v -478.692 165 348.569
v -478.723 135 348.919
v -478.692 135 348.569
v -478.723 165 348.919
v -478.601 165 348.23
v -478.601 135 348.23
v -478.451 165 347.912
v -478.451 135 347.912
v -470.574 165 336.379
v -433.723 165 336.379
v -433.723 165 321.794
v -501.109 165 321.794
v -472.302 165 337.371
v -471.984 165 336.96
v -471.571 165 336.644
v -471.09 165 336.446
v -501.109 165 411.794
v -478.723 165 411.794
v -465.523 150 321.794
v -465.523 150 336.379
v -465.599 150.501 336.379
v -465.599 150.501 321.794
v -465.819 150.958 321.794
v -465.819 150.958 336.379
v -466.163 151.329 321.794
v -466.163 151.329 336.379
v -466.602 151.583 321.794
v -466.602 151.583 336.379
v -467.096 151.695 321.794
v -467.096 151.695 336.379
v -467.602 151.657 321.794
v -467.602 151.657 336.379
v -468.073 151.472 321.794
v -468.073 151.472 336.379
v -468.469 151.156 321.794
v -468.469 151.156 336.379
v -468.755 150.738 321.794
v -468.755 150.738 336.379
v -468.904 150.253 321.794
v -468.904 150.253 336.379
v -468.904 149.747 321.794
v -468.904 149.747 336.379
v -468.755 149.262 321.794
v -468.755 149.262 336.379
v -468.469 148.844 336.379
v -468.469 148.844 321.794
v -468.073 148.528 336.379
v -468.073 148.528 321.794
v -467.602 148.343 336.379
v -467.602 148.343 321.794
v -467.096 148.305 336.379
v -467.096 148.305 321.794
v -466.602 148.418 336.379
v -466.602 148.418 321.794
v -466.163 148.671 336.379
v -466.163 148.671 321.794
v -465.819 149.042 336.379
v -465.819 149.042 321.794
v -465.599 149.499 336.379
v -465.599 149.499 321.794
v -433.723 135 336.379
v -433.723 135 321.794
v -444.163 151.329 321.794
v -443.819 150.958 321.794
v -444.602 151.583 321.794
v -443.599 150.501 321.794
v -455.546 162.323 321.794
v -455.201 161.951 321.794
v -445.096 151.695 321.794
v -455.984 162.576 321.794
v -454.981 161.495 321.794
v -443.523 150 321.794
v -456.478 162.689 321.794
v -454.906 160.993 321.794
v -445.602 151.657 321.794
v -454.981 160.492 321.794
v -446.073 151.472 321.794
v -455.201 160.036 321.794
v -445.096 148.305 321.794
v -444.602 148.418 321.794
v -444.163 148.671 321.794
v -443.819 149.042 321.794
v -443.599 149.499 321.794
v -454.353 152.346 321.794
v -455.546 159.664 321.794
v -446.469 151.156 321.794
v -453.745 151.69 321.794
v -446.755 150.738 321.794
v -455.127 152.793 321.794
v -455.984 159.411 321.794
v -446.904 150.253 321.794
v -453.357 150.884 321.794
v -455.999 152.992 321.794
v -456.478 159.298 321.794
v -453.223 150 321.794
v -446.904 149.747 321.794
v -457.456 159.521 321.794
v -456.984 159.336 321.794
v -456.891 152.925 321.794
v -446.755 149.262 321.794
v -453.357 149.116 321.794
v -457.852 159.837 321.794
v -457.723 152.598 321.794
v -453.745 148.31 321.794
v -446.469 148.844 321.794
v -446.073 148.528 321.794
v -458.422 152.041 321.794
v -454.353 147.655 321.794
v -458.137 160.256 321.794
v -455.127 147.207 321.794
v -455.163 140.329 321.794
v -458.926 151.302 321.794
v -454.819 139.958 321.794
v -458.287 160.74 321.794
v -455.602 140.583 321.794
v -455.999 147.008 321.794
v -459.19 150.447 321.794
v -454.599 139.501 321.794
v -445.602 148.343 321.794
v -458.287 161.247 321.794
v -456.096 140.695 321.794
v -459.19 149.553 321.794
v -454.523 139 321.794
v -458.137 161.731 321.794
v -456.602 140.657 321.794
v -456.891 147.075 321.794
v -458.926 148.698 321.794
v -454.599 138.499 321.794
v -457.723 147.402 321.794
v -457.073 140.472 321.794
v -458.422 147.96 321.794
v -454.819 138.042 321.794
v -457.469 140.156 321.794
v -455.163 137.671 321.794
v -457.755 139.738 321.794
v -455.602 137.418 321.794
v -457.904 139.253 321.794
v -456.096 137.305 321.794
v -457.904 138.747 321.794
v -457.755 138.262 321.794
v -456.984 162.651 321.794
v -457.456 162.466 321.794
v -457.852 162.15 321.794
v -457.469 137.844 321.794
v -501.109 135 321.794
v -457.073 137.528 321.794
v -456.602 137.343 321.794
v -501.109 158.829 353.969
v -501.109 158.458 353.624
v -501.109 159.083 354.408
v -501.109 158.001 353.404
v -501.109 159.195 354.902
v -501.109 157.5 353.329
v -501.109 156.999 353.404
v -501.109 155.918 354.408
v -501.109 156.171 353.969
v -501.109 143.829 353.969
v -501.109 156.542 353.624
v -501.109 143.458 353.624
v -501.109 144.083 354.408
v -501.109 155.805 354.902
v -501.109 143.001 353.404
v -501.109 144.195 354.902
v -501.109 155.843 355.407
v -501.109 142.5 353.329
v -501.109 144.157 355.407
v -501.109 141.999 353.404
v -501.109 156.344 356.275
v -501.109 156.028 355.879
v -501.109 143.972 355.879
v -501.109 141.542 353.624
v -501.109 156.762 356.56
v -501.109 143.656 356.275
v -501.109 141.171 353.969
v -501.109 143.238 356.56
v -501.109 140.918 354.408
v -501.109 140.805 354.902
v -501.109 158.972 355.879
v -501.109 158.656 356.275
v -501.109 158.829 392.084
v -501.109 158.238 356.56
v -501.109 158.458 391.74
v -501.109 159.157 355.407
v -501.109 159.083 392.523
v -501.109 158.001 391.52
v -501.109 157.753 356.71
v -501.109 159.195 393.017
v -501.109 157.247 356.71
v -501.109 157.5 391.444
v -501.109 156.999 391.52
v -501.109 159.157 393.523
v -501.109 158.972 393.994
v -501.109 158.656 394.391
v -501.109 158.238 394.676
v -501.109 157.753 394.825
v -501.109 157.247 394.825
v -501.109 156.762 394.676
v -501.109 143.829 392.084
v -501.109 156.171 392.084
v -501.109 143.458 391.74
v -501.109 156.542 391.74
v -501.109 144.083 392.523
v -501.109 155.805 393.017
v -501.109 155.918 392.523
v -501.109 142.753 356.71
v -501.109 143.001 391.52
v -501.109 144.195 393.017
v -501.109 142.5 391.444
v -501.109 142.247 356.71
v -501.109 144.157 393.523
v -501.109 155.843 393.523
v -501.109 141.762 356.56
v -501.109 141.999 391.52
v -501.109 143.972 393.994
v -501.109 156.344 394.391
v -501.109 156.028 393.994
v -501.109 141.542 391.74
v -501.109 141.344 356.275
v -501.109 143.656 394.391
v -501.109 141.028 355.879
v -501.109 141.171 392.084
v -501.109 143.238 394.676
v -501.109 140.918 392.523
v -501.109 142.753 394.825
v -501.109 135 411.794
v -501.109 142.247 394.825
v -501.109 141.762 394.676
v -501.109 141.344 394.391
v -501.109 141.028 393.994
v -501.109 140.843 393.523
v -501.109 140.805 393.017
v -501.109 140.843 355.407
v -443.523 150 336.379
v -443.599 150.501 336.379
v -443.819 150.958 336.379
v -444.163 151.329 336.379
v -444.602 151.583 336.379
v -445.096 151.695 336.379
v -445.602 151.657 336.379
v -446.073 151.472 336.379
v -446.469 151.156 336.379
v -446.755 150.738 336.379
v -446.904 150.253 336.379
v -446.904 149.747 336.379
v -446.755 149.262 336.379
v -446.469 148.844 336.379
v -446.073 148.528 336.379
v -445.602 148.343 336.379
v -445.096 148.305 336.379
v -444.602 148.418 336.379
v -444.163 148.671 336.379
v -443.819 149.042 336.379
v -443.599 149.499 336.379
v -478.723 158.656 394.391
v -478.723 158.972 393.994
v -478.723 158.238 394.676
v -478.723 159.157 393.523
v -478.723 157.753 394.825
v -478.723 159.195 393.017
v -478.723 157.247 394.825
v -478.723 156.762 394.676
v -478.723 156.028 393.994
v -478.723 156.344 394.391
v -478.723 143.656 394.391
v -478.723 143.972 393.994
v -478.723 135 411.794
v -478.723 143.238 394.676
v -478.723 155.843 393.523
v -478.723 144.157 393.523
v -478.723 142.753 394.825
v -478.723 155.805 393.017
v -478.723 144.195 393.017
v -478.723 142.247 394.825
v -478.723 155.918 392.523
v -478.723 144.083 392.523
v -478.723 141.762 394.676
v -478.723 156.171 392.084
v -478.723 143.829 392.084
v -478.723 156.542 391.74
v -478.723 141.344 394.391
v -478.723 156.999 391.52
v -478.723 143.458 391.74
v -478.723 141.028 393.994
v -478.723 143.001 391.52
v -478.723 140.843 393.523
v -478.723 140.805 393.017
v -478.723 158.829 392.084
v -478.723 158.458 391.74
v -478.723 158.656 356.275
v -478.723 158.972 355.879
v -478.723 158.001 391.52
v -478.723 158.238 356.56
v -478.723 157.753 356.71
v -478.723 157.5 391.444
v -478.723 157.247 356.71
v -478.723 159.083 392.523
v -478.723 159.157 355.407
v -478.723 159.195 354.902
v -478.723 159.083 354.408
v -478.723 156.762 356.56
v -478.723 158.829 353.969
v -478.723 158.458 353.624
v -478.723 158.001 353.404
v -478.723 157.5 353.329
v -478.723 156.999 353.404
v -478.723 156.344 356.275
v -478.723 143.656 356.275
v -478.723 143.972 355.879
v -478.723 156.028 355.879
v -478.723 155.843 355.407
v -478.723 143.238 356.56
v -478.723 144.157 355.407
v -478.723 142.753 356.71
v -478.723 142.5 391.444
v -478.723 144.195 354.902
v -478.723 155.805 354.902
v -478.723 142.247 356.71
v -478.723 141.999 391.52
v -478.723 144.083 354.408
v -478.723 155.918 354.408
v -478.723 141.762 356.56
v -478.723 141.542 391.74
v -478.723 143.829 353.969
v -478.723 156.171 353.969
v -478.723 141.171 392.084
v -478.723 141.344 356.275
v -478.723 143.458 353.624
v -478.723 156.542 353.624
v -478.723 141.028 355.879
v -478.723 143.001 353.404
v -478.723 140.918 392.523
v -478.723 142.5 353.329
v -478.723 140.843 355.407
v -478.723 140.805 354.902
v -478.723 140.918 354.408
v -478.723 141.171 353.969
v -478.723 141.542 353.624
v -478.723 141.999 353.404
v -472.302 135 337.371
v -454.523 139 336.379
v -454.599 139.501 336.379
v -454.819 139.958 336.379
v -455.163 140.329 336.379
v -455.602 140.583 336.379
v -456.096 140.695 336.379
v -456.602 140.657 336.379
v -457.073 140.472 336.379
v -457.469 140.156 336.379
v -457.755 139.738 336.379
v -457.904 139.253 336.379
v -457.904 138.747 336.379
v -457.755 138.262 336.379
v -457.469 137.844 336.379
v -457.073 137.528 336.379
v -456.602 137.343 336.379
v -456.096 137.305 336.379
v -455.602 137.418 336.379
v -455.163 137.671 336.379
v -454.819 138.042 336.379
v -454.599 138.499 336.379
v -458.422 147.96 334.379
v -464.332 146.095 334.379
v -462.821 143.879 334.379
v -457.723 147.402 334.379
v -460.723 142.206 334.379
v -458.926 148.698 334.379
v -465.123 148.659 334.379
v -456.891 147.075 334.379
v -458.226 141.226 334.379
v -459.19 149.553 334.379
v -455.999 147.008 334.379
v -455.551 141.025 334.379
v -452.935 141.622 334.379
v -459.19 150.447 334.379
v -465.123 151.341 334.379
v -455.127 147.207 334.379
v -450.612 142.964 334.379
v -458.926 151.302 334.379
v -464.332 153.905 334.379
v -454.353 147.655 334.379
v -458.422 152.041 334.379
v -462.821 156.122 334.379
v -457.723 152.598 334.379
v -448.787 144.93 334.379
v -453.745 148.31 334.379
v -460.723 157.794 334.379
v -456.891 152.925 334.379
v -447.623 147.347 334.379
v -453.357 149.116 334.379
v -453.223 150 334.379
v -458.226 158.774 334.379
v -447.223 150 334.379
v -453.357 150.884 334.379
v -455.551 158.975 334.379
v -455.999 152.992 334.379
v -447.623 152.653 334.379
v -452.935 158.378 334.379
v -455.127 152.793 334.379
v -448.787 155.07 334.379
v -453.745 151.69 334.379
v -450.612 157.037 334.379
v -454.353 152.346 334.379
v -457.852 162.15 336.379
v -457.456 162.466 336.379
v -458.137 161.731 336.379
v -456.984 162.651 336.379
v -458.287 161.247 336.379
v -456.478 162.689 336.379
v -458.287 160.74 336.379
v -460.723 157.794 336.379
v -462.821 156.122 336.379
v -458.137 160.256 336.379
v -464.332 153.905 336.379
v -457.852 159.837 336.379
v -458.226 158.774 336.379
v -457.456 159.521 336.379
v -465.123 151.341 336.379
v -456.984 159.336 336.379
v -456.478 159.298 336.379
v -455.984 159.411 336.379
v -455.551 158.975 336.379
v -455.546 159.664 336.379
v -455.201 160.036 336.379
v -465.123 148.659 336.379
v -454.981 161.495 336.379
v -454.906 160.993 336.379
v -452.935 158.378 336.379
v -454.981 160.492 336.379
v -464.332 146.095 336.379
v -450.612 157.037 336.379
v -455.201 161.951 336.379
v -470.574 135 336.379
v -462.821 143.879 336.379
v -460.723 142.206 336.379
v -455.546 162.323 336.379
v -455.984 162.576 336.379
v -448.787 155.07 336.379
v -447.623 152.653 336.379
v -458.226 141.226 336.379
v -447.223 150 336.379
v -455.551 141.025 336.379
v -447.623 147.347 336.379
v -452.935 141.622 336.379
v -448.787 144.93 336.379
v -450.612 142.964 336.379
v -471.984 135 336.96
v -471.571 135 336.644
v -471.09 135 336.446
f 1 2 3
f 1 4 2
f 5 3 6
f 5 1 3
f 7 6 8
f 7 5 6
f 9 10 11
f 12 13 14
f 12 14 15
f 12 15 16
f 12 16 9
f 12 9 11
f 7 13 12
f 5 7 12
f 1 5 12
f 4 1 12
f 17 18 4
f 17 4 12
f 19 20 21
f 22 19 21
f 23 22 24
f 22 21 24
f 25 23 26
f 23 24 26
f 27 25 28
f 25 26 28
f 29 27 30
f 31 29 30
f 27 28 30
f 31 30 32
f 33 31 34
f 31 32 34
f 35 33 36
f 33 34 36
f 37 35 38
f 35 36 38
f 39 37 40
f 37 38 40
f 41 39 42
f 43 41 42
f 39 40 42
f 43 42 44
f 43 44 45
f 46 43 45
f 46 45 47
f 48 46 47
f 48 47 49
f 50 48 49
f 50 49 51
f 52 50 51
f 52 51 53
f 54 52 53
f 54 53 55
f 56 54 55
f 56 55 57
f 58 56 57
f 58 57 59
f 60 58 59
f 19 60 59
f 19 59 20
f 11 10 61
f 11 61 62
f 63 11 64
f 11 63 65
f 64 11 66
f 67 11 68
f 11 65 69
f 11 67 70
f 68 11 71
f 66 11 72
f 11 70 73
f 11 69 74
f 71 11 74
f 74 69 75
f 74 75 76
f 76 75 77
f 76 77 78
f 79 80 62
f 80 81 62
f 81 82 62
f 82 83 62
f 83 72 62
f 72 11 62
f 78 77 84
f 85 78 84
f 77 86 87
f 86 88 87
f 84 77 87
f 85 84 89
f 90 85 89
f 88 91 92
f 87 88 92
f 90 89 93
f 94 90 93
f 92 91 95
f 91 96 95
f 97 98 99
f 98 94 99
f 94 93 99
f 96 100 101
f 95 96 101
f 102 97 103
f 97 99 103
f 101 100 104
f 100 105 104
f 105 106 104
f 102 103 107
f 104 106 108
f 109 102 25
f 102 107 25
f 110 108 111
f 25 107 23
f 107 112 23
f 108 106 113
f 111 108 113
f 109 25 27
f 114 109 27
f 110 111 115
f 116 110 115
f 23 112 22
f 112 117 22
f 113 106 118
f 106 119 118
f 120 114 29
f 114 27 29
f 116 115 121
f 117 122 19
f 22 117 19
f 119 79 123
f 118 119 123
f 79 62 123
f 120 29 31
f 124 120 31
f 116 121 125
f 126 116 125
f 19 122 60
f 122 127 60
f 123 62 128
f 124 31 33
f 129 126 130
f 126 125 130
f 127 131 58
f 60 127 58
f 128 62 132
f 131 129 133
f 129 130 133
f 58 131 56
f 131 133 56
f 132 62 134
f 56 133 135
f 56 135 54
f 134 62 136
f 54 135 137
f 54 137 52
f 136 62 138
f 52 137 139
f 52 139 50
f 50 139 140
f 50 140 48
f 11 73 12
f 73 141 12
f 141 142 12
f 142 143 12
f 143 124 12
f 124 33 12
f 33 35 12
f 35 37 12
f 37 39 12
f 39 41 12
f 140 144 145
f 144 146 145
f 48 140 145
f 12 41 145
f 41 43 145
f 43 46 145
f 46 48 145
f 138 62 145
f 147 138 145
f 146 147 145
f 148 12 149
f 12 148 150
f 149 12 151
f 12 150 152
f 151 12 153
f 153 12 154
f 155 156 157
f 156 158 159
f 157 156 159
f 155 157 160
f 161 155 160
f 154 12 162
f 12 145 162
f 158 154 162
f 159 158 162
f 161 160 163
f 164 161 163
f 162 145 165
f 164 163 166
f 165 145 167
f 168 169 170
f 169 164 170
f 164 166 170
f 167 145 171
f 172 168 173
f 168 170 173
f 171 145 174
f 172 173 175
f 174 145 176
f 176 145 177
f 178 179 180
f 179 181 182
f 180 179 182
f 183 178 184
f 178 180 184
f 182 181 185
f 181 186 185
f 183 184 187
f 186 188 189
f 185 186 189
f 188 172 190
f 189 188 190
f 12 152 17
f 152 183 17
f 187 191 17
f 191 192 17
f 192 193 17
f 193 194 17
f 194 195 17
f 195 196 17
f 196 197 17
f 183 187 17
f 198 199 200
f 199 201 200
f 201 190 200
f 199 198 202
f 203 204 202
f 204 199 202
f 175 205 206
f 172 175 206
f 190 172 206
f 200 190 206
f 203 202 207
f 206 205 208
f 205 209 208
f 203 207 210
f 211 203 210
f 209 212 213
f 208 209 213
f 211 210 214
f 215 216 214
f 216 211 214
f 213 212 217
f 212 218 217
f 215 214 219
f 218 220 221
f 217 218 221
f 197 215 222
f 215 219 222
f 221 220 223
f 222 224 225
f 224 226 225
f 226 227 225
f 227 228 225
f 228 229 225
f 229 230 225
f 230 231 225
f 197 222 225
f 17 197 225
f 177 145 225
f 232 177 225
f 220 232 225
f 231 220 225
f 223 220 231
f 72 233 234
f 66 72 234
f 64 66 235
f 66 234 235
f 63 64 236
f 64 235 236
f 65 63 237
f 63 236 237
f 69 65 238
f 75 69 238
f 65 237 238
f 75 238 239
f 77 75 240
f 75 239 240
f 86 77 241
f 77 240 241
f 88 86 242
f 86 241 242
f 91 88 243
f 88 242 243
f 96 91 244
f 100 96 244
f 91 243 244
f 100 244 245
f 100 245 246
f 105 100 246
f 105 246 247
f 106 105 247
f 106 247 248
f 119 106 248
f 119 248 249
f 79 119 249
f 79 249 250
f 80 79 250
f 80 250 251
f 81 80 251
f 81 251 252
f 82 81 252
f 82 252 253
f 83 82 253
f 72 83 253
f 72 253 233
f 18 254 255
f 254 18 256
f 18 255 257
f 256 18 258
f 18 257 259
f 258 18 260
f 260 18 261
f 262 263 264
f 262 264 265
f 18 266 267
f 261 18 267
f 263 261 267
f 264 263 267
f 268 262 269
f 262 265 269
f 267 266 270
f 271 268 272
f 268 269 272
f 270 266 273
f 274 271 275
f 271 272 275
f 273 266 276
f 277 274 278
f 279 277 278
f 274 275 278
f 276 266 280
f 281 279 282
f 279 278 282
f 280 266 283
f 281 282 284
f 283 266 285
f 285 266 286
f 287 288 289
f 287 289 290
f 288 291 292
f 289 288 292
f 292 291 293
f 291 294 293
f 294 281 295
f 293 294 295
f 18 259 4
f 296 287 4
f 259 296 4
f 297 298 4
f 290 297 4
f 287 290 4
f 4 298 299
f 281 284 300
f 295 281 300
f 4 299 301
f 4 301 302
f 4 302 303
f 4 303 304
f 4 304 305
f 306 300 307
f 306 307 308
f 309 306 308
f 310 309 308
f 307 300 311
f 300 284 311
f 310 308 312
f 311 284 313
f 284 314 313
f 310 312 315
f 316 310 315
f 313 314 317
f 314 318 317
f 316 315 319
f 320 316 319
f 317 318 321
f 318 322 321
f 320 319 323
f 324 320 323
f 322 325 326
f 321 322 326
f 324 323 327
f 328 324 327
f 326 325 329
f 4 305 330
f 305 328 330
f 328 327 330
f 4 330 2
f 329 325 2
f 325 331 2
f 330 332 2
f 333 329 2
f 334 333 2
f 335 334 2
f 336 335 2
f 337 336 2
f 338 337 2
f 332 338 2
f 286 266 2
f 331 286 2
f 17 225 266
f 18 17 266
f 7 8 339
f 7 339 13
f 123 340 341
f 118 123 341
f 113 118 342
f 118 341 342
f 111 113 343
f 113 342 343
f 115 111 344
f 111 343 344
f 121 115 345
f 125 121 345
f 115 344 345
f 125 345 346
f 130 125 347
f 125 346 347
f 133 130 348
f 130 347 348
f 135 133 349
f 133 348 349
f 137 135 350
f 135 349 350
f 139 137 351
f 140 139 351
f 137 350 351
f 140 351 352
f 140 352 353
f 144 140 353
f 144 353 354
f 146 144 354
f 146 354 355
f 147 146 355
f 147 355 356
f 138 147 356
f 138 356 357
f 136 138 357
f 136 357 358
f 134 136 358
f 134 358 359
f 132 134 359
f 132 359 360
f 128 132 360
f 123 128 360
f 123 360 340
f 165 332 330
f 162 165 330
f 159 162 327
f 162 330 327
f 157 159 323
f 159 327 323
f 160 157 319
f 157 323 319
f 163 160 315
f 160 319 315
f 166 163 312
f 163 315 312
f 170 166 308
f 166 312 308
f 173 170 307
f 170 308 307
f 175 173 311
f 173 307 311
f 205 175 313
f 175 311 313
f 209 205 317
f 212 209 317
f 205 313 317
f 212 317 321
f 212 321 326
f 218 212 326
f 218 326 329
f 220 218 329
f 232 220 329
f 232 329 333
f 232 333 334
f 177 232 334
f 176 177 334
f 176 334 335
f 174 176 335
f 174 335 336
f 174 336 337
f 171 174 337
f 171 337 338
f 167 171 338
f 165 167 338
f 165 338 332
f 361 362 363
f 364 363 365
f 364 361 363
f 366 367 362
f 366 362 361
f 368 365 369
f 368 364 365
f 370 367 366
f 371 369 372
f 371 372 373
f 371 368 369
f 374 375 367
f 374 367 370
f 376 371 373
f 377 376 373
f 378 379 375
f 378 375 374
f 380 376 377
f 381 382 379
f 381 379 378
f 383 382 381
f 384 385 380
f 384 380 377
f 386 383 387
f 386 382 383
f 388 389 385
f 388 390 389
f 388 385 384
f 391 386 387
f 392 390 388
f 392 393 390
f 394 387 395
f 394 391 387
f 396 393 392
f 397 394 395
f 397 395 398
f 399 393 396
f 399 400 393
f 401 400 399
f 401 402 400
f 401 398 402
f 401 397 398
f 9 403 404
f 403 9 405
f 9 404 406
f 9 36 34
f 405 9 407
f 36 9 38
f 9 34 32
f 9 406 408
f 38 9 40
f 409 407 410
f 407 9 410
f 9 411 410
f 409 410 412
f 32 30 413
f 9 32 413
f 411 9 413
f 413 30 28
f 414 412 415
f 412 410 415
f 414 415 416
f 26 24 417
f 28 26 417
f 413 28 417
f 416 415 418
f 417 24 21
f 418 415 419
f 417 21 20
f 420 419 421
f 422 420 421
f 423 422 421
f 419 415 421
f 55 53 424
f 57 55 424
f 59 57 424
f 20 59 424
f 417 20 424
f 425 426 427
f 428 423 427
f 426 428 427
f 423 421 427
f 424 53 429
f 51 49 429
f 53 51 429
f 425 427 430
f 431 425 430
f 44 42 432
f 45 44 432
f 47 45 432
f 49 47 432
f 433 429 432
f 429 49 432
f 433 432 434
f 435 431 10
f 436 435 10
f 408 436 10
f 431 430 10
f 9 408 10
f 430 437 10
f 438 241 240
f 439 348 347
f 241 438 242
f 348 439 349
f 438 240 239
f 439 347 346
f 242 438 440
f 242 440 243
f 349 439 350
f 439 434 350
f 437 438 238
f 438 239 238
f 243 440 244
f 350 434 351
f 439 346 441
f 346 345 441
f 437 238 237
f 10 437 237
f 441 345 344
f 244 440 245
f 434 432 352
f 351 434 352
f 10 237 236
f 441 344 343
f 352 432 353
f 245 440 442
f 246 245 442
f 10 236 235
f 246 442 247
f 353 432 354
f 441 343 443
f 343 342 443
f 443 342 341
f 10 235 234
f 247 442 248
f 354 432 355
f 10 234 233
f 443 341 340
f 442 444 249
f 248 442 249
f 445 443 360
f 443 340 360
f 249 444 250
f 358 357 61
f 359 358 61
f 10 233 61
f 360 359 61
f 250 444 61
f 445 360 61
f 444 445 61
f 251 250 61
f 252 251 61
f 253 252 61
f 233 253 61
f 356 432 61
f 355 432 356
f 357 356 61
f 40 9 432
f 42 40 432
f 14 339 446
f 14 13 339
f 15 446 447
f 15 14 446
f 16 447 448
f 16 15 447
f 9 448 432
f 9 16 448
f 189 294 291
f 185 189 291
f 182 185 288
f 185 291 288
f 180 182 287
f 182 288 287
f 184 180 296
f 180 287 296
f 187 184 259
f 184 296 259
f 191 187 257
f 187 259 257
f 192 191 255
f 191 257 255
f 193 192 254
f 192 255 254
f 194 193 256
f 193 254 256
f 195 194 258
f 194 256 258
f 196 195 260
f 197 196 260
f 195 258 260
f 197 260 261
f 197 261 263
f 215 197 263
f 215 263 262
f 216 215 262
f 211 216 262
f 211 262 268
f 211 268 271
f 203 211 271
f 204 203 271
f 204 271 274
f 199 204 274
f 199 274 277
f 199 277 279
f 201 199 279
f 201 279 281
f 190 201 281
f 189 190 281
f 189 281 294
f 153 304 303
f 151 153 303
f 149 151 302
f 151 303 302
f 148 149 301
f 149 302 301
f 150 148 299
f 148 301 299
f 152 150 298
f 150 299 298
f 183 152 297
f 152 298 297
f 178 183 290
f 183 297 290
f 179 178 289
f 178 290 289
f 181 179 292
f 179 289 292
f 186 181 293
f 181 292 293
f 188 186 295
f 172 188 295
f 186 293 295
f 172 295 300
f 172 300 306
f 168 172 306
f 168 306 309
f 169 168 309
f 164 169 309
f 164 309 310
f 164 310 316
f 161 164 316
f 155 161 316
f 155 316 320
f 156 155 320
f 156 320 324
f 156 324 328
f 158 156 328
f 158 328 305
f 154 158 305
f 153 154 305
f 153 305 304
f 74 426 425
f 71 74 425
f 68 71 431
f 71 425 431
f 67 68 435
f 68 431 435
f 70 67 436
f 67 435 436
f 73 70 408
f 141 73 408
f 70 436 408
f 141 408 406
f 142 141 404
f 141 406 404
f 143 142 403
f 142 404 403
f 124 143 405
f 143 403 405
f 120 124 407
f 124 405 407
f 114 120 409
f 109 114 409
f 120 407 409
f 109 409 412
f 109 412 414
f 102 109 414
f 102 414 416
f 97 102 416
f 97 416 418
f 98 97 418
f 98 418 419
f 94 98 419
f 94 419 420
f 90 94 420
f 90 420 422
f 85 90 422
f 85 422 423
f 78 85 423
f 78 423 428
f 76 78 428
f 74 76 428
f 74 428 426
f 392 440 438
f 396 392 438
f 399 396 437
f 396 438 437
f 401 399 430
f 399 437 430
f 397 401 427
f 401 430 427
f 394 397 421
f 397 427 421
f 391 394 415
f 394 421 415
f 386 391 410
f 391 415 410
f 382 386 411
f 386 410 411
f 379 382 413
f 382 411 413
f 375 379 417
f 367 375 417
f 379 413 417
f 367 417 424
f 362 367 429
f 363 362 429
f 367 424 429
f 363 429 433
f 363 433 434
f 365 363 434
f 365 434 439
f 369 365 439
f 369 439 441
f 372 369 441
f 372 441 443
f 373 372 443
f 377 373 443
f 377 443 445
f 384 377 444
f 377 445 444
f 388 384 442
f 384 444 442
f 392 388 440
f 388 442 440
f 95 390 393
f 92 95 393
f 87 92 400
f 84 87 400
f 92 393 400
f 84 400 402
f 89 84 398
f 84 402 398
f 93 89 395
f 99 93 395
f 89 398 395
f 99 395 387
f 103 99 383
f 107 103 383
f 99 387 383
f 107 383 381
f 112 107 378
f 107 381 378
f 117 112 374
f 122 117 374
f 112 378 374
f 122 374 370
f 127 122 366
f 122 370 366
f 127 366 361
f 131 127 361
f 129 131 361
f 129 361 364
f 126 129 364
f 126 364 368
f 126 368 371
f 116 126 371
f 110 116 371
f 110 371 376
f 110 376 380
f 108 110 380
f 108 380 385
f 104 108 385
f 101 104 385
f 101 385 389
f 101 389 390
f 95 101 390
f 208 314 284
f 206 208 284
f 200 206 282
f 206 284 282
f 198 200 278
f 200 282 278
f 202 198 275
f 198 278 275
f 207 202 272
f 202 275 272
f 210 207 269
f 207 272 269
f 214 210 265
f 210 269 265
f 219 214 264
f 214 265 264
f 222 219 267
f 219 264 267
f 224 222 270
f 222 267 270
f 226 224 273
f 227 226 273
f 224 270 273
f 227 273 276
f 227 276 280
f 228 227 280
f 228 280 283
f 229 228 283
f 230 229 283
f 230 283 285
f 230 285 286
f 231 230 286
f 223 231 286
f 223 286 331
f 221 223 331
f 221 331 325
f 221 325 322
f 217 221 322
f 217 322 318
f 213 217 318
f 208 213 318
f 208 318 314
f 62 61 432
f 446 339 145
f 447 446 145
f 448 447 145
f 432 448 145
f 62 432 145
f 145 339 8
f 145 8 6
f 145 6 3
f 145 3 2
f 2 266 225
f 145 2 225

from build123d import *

# Parameters (mm, degrees)
BOSS_EXTRUDE1_DEPTH = 300
SKETCH3_R           = 17
SKETCH3_R_2         = 30
CUT_EXTRUDE1_DEPTH  = 1055.907875982
SKETCH4_R           = 90
CUT_EXTRUDE2_DEPTH  = 20
SKETCH5_R           = 17
CUT_EXTRUDE3_DEPTH  = 1051
CHAMFER1_SIZE       = 70
CHAMFER1_SIZE2      = 120
FILLET1_R           = 20
SCALE1_SCALE        = 0.1


with BuildPart() as part:
    # Sketch2 → Boss-Extrude1 (new body)
    with BuildSketch(Plane(origin=(0, 0, 0), x_dir=(-1, 0, 0), z_dir=(0, 1, 0))):
        Polygon((0, 0), (673.85334868, 0), (673.85334868, 900), (450, 900), (450, 145.843324447), (0, 145.843324447), align=None)
    extrude(amount=BOSS_EXTRUDE1_DEPTH)

    # Sketch3 → Cut-Extrude1 (cut, through all)
    with BuildSketch(Plane.XY.offset(145.843324447)):
        with Locations((-335, 150)):
            Circle(SKETCH3_R)
        with Locations((-228.822978678, 259.933547355)):
            Circle(SKETCH3_R)
        with Locations((-115, 150)):
            Circle(SKETCH3_R)
        with Locations((-225, 40)):
            Circle(SKETCH3_R)
        with Locations((-225, 150)):
            Circle(SKETCH3_R_2)
    extrude(amount=-CUT_EXTRUDE1_DEPTH, mode=Mode.SUBTRACT)

    # Sketch4 → Cut-Extrude2 (cut)
    with BuildSketch(Plane.XY.offset(145.843324447)):
        with Locations((-225, 150)):
            Circle(SKETCH4_R)
    extrude(amount=-CUT_EXTRUDE2_DEPTH, mode=Mode.SUBTRACT)

    # Sketch5 → Cut-Extrude3 (cut, through all)
    with BuildSketch(Plane.YZ.offset(-450)):
        with Locations(Location((75, 713.5, 0), (0, 0, 270))):
            Circle(SKETCH5_R)
        with Locations(Location((225, 713.5, 0), (0, 0, 270))):
            Circle(SKETCH5_R)
        with Locations(Location((75, 332.343324447, 0), (0, 0, 270))):
            Circle(SKETCH5_R)
        with Locations(Location((225, 332.343324447, 0), (0, 0, 270))):
            Circle(SKETCH5_R)
    extrude(amount=-CUT_EXTRUDE3_DEPTH, mode=Mode.SUBTRACT)

    # Chamfer1
    chamfer1_edges = [part.edges().sort_by_distance(p)[0] for p in [
        (-450, 150, 145.843324447),
    ]]
    chamfer1_side = [part.faces().sort_by_distance(p)[0] for p in [
        (-444.591673087, 150, 145.843324447),
    ]]
    chamfer(chamfer1_edges, length=CHAMFER1_SIZE, length2=CHAMFER1_SIZE2, reference=chamfer1_side[0])

    # Fillet1
    fillet1_edges = [part.edges().sort_by_distance(p)[0] for p in [
        (-380, 150, 145.843324447),
        (-450, 150, 265.843324447),
    ]]
    fillet(fillet1_edges, radius=FILLET1_R)


with BuildPart() as part_1:
    # Scale1: scaled about (-481.914690358, 150.000111117, 357.549237265)
    add(part.part.scale(SCALE1_SCALE).moved(Location((-433.723221322, 135.000100005, 321.794313538))))


solid = part_1.part
